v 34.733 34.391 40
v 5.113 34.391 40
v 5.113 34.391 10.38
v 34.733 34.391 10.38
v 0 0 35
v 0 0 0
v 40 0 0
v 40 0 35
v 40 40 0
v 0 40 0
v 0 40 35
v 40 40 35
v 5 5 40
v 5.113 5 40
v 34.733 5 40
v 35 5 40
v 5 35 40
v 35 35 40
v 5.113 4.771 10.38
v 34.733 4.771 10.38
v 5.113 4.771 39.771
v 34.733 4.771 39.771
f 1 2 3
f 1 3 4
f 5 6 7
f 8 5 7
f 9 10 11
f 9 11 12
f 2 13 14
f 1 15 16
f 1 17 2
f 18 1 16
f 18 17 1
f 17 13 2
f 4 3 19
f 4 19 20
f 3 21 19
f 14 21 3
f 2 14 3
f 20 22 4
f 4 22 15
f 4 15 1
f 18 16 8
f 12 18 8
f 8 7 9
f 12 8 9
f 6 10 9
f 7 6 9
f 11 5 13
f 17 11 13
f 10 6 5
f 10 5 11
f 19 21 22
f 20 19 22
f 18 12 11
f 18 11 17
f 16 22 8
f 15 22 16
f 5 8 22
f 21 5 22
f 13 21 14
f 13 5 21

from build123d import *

# Parameters (mm, degrees)
F0_W        = 40
F0_H        = 40
F1_DEPTH    = 40
F2_W        = 29.62
F2_H        = 29.62
F3_DEPTH    = 29.62
F4_T1_DEPTH = 65.7168298797
F4_T3_DEPTH = 65.7168298797


# Not quite as in the source:
# - a fillet or chamfer that OpenCascade refuses, or shapes differently, is made with other operations: its cross-section is extruded or revolved along the edge and cut away or added


with BuildPart() as f1:
    # F0 (on Top) → F1 (new body)
    with BuildSketch(Plane.XY):
        with Locations((20, 20)):
            Rectangle(F0_W, F0_H)
    extrude(amount=F1_DEPTH)

    # F2 (on face) → F3 (cut)
    with BuildSketch(Plane.XY.offset(40)):
        with Locations((19.9230909348, 19.5811167631)):
            Rectangle(F2_W, F2_H)
    extrude(amount=-F3_DEPTH, mode=Mode.SUBTRACT)

    # F4: chamfer of 5 on 4 edges, made by hand

    # F4_s2 → F4_t1 (cut)
    with BuildSketch(Plane.YZ.offset(-12.8584149398)):
        Polygon((0, 35), (5, 40), (0, 40), align=None)
        Polygon((40, 35), (35, 40), (40, 40), align=None)
    extrude(amount=F4_T1_DEPTH, mode=Mode.SUBTRACT)

    # F4_s4 → F4_t3 (cut)
    with BuildSketch(Plane.XZ.offset(-52.8584149398)):
        Polygon((35, 40), (40, 35), (40, 40), align=None)
        Polygon((0, 35), (5, 40), (0, 40), align=None)
    extrude(amount=F4_T3_DEPTH, mode=Mode.SUBTRACT)


solid = f1.part
